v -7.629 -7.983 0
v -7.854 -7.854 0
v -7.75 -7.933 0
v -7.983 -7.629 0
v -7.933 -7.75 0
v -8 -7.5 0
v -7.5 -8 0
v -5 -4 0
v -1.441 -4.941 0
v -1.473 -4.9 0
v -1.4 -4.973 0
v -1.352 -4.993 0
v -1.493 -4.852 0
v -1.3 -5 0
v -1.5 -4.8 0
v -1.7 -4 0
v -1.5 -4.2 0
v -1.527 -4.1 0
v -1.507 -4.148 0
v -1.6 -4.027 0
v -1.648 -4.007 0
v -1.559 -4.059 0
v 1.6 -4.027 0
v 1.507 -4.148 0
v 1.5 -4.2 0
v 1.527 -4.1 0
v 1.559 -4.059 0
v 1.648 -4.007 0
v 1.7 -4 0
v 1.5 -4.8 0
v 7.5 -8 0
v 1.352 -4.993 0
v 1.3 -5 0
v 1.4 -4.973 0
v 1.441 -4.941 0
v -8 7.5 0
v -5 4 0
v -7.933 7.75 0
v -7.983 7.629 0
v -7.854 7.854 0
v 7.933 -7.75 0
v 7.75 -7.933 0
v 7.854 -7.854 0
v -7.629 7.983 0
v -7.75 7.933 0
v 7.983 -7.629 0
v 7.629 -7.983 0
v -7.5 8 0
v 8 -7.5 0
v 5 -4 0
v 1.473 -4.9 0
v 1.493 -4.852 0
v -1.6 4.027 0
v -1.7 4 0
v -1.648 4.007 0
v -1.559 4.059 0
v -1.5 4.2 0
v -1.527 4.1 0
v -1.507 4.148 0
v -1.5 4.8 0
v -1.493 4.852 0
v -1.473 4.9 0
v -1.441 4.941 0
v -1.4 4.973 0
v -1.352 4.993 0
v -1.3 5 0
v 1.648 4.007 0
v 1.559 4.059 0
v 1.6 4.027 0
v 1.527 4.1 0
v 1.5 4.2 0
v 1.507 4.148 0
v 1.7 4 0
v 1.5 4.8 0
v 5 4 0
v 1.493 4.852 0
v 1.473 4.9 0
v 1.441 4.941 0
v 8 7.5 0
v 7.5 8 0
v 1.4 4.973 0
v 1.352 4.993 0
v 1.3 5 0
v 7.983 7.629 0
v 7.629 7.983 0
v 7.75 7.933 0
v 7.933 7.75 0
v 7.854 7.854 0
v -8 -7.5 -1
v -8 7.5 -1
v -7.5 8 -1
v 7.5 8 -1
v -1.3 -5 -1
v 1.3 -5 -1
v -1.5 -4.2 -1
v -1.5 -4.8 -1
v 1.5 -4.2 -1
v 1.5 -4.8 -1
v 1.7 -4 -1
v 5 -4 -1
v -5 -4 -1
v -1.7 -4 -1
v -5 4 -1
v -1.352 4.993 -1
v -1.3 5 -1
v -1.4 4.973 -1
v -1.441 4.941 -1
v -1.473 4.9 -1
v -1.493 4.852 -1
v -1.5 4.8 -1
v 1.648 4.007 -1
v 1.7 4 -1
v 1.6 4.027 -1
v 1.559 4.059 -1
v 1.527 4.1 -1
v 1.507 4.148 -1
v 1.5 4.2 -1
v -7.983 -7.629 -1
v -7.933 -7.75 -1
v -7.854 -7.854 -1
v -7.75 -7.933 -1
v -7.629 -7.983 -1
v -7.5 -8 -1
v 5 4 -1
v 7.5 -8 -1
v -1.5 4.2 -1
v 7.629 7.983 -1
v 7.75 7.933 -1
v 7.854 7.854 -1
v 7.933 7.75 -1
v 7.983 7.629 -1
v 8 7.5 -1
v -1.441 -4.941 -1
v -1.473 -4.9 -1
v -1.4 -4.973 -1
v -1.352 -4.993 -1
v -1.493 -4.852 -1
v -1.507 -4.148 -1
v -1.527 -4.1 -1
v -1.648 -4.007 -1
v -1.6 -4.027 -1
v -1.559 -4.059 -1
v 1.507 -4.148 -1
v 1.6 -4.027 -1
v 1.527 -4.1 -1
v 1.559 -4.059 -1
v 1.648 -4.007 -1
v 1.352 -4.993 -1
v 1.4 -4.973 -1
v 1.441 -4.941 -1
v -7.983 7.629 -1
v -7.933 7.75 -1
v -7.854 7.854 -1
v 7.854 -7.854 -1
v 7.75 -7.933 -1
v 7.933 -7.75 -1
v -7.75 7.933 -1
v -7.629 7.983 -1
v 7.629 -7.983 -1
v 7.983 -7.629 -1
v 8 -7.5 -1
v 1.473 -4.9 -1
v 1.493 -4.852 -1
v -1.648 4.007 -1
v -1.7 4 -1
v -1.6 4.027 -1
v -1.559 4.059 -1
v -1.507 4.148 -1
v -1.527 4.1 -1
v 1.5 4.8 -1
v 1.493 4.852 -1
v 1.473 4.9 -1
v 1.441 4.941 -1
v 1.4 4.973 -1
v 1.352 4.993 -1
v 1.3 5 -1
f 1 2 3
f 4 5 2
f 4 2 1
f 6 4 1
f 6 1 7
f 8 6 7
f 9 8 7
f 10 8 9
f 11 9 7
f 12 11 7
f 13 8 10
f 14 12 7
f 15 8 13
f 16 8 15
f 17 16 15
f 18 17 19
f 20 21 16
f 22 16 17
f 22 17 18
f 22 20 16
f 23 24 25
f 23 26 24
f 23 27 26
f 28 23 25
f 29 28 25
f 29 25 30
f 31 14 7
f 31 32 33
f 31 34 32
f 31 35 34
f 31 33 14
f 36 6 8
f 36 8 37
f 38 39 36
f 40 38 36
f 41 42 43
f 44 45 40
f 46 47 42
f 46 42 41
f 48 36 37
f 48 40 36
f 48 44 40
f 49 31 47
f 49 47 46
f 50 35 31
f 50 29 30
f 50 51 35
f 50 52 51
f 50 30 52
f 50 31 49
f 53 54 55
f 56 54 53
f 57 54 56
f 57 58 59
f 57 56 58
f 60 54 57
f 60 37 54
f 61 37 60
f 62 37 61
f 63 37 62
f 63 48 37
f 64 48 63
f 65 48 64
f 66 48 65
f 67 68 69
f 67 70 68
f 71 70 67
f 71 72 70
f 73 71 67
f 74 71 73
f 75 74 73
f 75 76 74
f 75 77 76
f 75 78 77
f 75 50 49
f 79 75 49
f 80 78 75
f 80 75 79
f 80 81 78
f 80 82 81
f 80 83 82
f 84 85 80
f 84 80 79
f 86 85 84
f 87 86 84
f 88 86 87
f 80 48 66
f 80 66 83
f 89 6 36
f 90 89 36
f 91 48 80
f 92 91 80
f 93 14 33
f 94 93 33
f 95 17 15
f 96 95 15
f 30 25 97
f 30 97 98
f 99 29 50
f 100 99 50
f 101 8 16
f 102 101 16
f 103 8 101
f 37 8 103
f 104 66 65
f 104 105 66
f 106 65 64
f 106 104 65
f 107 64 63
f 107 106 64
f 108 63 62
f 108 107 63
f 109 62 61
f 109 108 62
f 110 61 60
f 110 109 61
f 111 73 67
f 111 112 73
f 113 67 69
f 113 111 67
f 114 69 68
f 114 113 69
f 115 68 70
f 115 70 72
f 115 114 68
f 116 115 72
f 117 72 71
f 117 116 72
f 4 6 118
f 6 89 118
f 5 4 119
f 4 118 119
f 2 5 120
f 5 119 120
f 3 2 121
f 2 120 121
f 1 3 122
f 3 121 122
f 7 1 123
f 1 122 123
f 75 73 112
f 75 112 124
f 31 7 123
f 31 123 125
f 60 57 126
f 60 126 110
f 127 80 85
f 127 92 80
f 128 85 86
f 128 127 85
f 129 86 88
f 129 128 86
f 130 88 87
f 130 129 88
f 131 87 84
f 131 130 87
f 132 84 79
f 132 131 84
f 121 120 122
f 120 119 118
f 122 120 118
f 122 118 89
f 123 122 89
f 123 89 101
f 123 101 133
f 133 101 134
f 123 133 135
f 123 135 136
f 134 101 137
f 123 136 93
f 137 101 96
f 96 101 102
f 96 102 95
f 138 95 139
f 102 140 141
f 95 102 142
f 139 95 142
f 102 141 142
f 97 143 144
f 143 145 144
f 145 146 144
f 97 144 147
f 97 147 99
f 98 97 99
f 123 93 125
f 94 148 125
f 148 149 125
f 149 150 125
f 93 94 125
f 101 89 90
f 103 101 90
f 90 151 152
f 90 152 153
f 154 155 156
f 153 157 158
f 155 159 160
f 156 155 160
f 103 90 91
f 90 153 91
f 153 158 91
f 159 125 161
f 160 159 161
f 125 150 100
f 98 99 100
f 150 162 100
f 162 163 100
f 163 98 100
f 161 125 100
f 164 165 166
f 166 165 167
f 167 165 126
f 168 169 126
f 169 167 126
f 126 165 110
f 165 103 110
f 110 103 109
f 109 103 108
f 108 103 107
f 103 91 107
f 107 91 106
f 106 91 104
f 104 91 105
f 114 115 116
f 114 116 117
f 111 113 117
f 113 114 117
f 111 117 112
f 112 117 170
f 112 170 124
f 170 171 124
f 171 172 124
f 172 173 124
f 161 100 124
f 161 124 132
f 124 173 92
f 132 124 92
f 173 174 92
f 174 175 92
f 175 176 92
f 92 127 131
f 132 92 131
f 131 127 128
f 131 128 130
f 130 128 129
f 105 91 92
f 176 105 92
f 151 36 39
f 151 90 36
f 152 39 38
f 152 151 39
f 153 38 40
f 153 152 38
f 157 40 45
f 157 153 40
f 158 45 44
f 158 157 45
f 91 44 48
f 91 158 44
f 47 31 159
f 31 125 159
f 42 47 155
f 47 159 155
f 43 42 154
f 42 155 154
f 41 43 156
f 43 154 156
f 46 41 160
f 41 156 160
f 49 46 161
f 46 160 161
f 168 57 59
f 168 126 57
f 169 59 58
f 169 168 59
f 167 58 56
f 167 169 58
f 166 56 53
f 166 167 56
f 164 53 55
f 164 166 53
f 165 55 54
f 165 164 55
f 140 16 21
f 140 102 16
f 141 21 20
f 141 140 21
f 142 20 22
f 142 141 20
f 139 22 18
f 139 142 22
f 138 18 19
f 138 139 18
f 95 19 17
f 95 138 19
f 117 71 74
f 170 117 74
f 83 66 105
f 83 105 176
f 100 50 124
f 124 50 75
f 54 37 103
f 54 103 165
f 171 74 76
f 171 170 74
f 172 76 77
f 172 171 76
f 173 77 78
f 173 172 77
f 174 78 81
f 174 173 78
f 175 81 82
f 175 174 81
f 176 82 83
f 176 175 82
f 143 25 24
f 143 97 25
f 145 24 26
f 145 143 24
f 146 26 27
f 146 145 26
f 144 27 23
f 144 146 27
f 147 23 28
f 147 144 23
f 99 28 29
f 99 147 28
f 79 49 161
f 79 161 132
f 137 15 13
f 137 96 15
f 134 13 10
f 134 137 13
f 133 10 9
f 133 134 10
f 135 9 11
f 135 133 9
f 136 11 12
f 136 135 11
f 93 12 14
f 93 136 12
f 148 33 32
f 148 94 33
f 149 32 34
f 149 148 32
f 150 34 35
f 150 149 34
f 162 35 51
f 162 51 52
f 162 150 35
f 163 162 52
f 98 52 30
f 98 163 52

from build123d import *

# Parameters (mm, degrees)
MAINBODYS_W     = 16
MAINBODYS_H     = 16
MAIN_BODY_DEPTH = 1
MIDCUTS_W       = 10
MIDCUTS_H       = 8
MID_CUT_DEPTH   = 12.357816692
GROUNDCUTS_W    = 3
GROUNDCUTS_H    = 1
GROUNDCUT_DEPTH = 12.357816692
OUTER_FILLETS_R = 0.5
GCF_R           = 0.2


with BuildPart() as part:
    # MainBodyS → MAIN BODY (new body)
    with BuildSketch(Plane.XY):
        Rectangle(MAINBODYS_W, MAINBODYS_H)
    extrude(amount=-MAIN_BODY_DEPTH)

    # MidCutS → MID CUT (cut, through all)
    with BuildSketch(Plane.XY):
        Rectangle(MIDCUTS_W, MIDCUTS_H)
    extrude(amount=-MID_CUT_DEPTH, mode=Mode.SUBTRACT)

    # GroundCutS → GroundCut (cut, through all)
    with BuildSketch(Plane.XY):
        with Locations((0, 4.5)):
            Rectangle(GROUNDCUTS_W, GROUNDCUTS_H)
    groundcut = extrude(amount=-GROUNDCUT_DEPTH, mode=Mode.SUBTRACT)

    # GCVM: GroundCut across plane
    add(groundcut.mirror(Plane.ZX), mode=Mode.SUBTRACT)

    # OUTER FILLETS
    outer_fillets_edges = [part.edges().sort_by_distance(p)[0] for p in [
        (8, -8, -0.5),
        (-8, -8, -0.5),
        (-8, 8, -0.5),
        (8, 8, -0.5),
    ]]
    fillet(outer_fillets_edges, radius=OUTER_FILLETS_R)

    # GCF
    gcf_edges = [part.edges().sort_by_distance(p)[0] for p in [
        (1.5, 5, -0.5),
        (1.5, 4, -0.5),
        (-1.5, 4, -0.5),
        (-1.5, 5, -0.5),
        (1.5, -4, -0.5),
        (1.5, -5, -0.5),
        (-1.5, -5, -0.5),
        (-1.5, -4, -0.5),
    ]]
    fillet(gcf_edges, radius=GCF_R)


solid = part.part
